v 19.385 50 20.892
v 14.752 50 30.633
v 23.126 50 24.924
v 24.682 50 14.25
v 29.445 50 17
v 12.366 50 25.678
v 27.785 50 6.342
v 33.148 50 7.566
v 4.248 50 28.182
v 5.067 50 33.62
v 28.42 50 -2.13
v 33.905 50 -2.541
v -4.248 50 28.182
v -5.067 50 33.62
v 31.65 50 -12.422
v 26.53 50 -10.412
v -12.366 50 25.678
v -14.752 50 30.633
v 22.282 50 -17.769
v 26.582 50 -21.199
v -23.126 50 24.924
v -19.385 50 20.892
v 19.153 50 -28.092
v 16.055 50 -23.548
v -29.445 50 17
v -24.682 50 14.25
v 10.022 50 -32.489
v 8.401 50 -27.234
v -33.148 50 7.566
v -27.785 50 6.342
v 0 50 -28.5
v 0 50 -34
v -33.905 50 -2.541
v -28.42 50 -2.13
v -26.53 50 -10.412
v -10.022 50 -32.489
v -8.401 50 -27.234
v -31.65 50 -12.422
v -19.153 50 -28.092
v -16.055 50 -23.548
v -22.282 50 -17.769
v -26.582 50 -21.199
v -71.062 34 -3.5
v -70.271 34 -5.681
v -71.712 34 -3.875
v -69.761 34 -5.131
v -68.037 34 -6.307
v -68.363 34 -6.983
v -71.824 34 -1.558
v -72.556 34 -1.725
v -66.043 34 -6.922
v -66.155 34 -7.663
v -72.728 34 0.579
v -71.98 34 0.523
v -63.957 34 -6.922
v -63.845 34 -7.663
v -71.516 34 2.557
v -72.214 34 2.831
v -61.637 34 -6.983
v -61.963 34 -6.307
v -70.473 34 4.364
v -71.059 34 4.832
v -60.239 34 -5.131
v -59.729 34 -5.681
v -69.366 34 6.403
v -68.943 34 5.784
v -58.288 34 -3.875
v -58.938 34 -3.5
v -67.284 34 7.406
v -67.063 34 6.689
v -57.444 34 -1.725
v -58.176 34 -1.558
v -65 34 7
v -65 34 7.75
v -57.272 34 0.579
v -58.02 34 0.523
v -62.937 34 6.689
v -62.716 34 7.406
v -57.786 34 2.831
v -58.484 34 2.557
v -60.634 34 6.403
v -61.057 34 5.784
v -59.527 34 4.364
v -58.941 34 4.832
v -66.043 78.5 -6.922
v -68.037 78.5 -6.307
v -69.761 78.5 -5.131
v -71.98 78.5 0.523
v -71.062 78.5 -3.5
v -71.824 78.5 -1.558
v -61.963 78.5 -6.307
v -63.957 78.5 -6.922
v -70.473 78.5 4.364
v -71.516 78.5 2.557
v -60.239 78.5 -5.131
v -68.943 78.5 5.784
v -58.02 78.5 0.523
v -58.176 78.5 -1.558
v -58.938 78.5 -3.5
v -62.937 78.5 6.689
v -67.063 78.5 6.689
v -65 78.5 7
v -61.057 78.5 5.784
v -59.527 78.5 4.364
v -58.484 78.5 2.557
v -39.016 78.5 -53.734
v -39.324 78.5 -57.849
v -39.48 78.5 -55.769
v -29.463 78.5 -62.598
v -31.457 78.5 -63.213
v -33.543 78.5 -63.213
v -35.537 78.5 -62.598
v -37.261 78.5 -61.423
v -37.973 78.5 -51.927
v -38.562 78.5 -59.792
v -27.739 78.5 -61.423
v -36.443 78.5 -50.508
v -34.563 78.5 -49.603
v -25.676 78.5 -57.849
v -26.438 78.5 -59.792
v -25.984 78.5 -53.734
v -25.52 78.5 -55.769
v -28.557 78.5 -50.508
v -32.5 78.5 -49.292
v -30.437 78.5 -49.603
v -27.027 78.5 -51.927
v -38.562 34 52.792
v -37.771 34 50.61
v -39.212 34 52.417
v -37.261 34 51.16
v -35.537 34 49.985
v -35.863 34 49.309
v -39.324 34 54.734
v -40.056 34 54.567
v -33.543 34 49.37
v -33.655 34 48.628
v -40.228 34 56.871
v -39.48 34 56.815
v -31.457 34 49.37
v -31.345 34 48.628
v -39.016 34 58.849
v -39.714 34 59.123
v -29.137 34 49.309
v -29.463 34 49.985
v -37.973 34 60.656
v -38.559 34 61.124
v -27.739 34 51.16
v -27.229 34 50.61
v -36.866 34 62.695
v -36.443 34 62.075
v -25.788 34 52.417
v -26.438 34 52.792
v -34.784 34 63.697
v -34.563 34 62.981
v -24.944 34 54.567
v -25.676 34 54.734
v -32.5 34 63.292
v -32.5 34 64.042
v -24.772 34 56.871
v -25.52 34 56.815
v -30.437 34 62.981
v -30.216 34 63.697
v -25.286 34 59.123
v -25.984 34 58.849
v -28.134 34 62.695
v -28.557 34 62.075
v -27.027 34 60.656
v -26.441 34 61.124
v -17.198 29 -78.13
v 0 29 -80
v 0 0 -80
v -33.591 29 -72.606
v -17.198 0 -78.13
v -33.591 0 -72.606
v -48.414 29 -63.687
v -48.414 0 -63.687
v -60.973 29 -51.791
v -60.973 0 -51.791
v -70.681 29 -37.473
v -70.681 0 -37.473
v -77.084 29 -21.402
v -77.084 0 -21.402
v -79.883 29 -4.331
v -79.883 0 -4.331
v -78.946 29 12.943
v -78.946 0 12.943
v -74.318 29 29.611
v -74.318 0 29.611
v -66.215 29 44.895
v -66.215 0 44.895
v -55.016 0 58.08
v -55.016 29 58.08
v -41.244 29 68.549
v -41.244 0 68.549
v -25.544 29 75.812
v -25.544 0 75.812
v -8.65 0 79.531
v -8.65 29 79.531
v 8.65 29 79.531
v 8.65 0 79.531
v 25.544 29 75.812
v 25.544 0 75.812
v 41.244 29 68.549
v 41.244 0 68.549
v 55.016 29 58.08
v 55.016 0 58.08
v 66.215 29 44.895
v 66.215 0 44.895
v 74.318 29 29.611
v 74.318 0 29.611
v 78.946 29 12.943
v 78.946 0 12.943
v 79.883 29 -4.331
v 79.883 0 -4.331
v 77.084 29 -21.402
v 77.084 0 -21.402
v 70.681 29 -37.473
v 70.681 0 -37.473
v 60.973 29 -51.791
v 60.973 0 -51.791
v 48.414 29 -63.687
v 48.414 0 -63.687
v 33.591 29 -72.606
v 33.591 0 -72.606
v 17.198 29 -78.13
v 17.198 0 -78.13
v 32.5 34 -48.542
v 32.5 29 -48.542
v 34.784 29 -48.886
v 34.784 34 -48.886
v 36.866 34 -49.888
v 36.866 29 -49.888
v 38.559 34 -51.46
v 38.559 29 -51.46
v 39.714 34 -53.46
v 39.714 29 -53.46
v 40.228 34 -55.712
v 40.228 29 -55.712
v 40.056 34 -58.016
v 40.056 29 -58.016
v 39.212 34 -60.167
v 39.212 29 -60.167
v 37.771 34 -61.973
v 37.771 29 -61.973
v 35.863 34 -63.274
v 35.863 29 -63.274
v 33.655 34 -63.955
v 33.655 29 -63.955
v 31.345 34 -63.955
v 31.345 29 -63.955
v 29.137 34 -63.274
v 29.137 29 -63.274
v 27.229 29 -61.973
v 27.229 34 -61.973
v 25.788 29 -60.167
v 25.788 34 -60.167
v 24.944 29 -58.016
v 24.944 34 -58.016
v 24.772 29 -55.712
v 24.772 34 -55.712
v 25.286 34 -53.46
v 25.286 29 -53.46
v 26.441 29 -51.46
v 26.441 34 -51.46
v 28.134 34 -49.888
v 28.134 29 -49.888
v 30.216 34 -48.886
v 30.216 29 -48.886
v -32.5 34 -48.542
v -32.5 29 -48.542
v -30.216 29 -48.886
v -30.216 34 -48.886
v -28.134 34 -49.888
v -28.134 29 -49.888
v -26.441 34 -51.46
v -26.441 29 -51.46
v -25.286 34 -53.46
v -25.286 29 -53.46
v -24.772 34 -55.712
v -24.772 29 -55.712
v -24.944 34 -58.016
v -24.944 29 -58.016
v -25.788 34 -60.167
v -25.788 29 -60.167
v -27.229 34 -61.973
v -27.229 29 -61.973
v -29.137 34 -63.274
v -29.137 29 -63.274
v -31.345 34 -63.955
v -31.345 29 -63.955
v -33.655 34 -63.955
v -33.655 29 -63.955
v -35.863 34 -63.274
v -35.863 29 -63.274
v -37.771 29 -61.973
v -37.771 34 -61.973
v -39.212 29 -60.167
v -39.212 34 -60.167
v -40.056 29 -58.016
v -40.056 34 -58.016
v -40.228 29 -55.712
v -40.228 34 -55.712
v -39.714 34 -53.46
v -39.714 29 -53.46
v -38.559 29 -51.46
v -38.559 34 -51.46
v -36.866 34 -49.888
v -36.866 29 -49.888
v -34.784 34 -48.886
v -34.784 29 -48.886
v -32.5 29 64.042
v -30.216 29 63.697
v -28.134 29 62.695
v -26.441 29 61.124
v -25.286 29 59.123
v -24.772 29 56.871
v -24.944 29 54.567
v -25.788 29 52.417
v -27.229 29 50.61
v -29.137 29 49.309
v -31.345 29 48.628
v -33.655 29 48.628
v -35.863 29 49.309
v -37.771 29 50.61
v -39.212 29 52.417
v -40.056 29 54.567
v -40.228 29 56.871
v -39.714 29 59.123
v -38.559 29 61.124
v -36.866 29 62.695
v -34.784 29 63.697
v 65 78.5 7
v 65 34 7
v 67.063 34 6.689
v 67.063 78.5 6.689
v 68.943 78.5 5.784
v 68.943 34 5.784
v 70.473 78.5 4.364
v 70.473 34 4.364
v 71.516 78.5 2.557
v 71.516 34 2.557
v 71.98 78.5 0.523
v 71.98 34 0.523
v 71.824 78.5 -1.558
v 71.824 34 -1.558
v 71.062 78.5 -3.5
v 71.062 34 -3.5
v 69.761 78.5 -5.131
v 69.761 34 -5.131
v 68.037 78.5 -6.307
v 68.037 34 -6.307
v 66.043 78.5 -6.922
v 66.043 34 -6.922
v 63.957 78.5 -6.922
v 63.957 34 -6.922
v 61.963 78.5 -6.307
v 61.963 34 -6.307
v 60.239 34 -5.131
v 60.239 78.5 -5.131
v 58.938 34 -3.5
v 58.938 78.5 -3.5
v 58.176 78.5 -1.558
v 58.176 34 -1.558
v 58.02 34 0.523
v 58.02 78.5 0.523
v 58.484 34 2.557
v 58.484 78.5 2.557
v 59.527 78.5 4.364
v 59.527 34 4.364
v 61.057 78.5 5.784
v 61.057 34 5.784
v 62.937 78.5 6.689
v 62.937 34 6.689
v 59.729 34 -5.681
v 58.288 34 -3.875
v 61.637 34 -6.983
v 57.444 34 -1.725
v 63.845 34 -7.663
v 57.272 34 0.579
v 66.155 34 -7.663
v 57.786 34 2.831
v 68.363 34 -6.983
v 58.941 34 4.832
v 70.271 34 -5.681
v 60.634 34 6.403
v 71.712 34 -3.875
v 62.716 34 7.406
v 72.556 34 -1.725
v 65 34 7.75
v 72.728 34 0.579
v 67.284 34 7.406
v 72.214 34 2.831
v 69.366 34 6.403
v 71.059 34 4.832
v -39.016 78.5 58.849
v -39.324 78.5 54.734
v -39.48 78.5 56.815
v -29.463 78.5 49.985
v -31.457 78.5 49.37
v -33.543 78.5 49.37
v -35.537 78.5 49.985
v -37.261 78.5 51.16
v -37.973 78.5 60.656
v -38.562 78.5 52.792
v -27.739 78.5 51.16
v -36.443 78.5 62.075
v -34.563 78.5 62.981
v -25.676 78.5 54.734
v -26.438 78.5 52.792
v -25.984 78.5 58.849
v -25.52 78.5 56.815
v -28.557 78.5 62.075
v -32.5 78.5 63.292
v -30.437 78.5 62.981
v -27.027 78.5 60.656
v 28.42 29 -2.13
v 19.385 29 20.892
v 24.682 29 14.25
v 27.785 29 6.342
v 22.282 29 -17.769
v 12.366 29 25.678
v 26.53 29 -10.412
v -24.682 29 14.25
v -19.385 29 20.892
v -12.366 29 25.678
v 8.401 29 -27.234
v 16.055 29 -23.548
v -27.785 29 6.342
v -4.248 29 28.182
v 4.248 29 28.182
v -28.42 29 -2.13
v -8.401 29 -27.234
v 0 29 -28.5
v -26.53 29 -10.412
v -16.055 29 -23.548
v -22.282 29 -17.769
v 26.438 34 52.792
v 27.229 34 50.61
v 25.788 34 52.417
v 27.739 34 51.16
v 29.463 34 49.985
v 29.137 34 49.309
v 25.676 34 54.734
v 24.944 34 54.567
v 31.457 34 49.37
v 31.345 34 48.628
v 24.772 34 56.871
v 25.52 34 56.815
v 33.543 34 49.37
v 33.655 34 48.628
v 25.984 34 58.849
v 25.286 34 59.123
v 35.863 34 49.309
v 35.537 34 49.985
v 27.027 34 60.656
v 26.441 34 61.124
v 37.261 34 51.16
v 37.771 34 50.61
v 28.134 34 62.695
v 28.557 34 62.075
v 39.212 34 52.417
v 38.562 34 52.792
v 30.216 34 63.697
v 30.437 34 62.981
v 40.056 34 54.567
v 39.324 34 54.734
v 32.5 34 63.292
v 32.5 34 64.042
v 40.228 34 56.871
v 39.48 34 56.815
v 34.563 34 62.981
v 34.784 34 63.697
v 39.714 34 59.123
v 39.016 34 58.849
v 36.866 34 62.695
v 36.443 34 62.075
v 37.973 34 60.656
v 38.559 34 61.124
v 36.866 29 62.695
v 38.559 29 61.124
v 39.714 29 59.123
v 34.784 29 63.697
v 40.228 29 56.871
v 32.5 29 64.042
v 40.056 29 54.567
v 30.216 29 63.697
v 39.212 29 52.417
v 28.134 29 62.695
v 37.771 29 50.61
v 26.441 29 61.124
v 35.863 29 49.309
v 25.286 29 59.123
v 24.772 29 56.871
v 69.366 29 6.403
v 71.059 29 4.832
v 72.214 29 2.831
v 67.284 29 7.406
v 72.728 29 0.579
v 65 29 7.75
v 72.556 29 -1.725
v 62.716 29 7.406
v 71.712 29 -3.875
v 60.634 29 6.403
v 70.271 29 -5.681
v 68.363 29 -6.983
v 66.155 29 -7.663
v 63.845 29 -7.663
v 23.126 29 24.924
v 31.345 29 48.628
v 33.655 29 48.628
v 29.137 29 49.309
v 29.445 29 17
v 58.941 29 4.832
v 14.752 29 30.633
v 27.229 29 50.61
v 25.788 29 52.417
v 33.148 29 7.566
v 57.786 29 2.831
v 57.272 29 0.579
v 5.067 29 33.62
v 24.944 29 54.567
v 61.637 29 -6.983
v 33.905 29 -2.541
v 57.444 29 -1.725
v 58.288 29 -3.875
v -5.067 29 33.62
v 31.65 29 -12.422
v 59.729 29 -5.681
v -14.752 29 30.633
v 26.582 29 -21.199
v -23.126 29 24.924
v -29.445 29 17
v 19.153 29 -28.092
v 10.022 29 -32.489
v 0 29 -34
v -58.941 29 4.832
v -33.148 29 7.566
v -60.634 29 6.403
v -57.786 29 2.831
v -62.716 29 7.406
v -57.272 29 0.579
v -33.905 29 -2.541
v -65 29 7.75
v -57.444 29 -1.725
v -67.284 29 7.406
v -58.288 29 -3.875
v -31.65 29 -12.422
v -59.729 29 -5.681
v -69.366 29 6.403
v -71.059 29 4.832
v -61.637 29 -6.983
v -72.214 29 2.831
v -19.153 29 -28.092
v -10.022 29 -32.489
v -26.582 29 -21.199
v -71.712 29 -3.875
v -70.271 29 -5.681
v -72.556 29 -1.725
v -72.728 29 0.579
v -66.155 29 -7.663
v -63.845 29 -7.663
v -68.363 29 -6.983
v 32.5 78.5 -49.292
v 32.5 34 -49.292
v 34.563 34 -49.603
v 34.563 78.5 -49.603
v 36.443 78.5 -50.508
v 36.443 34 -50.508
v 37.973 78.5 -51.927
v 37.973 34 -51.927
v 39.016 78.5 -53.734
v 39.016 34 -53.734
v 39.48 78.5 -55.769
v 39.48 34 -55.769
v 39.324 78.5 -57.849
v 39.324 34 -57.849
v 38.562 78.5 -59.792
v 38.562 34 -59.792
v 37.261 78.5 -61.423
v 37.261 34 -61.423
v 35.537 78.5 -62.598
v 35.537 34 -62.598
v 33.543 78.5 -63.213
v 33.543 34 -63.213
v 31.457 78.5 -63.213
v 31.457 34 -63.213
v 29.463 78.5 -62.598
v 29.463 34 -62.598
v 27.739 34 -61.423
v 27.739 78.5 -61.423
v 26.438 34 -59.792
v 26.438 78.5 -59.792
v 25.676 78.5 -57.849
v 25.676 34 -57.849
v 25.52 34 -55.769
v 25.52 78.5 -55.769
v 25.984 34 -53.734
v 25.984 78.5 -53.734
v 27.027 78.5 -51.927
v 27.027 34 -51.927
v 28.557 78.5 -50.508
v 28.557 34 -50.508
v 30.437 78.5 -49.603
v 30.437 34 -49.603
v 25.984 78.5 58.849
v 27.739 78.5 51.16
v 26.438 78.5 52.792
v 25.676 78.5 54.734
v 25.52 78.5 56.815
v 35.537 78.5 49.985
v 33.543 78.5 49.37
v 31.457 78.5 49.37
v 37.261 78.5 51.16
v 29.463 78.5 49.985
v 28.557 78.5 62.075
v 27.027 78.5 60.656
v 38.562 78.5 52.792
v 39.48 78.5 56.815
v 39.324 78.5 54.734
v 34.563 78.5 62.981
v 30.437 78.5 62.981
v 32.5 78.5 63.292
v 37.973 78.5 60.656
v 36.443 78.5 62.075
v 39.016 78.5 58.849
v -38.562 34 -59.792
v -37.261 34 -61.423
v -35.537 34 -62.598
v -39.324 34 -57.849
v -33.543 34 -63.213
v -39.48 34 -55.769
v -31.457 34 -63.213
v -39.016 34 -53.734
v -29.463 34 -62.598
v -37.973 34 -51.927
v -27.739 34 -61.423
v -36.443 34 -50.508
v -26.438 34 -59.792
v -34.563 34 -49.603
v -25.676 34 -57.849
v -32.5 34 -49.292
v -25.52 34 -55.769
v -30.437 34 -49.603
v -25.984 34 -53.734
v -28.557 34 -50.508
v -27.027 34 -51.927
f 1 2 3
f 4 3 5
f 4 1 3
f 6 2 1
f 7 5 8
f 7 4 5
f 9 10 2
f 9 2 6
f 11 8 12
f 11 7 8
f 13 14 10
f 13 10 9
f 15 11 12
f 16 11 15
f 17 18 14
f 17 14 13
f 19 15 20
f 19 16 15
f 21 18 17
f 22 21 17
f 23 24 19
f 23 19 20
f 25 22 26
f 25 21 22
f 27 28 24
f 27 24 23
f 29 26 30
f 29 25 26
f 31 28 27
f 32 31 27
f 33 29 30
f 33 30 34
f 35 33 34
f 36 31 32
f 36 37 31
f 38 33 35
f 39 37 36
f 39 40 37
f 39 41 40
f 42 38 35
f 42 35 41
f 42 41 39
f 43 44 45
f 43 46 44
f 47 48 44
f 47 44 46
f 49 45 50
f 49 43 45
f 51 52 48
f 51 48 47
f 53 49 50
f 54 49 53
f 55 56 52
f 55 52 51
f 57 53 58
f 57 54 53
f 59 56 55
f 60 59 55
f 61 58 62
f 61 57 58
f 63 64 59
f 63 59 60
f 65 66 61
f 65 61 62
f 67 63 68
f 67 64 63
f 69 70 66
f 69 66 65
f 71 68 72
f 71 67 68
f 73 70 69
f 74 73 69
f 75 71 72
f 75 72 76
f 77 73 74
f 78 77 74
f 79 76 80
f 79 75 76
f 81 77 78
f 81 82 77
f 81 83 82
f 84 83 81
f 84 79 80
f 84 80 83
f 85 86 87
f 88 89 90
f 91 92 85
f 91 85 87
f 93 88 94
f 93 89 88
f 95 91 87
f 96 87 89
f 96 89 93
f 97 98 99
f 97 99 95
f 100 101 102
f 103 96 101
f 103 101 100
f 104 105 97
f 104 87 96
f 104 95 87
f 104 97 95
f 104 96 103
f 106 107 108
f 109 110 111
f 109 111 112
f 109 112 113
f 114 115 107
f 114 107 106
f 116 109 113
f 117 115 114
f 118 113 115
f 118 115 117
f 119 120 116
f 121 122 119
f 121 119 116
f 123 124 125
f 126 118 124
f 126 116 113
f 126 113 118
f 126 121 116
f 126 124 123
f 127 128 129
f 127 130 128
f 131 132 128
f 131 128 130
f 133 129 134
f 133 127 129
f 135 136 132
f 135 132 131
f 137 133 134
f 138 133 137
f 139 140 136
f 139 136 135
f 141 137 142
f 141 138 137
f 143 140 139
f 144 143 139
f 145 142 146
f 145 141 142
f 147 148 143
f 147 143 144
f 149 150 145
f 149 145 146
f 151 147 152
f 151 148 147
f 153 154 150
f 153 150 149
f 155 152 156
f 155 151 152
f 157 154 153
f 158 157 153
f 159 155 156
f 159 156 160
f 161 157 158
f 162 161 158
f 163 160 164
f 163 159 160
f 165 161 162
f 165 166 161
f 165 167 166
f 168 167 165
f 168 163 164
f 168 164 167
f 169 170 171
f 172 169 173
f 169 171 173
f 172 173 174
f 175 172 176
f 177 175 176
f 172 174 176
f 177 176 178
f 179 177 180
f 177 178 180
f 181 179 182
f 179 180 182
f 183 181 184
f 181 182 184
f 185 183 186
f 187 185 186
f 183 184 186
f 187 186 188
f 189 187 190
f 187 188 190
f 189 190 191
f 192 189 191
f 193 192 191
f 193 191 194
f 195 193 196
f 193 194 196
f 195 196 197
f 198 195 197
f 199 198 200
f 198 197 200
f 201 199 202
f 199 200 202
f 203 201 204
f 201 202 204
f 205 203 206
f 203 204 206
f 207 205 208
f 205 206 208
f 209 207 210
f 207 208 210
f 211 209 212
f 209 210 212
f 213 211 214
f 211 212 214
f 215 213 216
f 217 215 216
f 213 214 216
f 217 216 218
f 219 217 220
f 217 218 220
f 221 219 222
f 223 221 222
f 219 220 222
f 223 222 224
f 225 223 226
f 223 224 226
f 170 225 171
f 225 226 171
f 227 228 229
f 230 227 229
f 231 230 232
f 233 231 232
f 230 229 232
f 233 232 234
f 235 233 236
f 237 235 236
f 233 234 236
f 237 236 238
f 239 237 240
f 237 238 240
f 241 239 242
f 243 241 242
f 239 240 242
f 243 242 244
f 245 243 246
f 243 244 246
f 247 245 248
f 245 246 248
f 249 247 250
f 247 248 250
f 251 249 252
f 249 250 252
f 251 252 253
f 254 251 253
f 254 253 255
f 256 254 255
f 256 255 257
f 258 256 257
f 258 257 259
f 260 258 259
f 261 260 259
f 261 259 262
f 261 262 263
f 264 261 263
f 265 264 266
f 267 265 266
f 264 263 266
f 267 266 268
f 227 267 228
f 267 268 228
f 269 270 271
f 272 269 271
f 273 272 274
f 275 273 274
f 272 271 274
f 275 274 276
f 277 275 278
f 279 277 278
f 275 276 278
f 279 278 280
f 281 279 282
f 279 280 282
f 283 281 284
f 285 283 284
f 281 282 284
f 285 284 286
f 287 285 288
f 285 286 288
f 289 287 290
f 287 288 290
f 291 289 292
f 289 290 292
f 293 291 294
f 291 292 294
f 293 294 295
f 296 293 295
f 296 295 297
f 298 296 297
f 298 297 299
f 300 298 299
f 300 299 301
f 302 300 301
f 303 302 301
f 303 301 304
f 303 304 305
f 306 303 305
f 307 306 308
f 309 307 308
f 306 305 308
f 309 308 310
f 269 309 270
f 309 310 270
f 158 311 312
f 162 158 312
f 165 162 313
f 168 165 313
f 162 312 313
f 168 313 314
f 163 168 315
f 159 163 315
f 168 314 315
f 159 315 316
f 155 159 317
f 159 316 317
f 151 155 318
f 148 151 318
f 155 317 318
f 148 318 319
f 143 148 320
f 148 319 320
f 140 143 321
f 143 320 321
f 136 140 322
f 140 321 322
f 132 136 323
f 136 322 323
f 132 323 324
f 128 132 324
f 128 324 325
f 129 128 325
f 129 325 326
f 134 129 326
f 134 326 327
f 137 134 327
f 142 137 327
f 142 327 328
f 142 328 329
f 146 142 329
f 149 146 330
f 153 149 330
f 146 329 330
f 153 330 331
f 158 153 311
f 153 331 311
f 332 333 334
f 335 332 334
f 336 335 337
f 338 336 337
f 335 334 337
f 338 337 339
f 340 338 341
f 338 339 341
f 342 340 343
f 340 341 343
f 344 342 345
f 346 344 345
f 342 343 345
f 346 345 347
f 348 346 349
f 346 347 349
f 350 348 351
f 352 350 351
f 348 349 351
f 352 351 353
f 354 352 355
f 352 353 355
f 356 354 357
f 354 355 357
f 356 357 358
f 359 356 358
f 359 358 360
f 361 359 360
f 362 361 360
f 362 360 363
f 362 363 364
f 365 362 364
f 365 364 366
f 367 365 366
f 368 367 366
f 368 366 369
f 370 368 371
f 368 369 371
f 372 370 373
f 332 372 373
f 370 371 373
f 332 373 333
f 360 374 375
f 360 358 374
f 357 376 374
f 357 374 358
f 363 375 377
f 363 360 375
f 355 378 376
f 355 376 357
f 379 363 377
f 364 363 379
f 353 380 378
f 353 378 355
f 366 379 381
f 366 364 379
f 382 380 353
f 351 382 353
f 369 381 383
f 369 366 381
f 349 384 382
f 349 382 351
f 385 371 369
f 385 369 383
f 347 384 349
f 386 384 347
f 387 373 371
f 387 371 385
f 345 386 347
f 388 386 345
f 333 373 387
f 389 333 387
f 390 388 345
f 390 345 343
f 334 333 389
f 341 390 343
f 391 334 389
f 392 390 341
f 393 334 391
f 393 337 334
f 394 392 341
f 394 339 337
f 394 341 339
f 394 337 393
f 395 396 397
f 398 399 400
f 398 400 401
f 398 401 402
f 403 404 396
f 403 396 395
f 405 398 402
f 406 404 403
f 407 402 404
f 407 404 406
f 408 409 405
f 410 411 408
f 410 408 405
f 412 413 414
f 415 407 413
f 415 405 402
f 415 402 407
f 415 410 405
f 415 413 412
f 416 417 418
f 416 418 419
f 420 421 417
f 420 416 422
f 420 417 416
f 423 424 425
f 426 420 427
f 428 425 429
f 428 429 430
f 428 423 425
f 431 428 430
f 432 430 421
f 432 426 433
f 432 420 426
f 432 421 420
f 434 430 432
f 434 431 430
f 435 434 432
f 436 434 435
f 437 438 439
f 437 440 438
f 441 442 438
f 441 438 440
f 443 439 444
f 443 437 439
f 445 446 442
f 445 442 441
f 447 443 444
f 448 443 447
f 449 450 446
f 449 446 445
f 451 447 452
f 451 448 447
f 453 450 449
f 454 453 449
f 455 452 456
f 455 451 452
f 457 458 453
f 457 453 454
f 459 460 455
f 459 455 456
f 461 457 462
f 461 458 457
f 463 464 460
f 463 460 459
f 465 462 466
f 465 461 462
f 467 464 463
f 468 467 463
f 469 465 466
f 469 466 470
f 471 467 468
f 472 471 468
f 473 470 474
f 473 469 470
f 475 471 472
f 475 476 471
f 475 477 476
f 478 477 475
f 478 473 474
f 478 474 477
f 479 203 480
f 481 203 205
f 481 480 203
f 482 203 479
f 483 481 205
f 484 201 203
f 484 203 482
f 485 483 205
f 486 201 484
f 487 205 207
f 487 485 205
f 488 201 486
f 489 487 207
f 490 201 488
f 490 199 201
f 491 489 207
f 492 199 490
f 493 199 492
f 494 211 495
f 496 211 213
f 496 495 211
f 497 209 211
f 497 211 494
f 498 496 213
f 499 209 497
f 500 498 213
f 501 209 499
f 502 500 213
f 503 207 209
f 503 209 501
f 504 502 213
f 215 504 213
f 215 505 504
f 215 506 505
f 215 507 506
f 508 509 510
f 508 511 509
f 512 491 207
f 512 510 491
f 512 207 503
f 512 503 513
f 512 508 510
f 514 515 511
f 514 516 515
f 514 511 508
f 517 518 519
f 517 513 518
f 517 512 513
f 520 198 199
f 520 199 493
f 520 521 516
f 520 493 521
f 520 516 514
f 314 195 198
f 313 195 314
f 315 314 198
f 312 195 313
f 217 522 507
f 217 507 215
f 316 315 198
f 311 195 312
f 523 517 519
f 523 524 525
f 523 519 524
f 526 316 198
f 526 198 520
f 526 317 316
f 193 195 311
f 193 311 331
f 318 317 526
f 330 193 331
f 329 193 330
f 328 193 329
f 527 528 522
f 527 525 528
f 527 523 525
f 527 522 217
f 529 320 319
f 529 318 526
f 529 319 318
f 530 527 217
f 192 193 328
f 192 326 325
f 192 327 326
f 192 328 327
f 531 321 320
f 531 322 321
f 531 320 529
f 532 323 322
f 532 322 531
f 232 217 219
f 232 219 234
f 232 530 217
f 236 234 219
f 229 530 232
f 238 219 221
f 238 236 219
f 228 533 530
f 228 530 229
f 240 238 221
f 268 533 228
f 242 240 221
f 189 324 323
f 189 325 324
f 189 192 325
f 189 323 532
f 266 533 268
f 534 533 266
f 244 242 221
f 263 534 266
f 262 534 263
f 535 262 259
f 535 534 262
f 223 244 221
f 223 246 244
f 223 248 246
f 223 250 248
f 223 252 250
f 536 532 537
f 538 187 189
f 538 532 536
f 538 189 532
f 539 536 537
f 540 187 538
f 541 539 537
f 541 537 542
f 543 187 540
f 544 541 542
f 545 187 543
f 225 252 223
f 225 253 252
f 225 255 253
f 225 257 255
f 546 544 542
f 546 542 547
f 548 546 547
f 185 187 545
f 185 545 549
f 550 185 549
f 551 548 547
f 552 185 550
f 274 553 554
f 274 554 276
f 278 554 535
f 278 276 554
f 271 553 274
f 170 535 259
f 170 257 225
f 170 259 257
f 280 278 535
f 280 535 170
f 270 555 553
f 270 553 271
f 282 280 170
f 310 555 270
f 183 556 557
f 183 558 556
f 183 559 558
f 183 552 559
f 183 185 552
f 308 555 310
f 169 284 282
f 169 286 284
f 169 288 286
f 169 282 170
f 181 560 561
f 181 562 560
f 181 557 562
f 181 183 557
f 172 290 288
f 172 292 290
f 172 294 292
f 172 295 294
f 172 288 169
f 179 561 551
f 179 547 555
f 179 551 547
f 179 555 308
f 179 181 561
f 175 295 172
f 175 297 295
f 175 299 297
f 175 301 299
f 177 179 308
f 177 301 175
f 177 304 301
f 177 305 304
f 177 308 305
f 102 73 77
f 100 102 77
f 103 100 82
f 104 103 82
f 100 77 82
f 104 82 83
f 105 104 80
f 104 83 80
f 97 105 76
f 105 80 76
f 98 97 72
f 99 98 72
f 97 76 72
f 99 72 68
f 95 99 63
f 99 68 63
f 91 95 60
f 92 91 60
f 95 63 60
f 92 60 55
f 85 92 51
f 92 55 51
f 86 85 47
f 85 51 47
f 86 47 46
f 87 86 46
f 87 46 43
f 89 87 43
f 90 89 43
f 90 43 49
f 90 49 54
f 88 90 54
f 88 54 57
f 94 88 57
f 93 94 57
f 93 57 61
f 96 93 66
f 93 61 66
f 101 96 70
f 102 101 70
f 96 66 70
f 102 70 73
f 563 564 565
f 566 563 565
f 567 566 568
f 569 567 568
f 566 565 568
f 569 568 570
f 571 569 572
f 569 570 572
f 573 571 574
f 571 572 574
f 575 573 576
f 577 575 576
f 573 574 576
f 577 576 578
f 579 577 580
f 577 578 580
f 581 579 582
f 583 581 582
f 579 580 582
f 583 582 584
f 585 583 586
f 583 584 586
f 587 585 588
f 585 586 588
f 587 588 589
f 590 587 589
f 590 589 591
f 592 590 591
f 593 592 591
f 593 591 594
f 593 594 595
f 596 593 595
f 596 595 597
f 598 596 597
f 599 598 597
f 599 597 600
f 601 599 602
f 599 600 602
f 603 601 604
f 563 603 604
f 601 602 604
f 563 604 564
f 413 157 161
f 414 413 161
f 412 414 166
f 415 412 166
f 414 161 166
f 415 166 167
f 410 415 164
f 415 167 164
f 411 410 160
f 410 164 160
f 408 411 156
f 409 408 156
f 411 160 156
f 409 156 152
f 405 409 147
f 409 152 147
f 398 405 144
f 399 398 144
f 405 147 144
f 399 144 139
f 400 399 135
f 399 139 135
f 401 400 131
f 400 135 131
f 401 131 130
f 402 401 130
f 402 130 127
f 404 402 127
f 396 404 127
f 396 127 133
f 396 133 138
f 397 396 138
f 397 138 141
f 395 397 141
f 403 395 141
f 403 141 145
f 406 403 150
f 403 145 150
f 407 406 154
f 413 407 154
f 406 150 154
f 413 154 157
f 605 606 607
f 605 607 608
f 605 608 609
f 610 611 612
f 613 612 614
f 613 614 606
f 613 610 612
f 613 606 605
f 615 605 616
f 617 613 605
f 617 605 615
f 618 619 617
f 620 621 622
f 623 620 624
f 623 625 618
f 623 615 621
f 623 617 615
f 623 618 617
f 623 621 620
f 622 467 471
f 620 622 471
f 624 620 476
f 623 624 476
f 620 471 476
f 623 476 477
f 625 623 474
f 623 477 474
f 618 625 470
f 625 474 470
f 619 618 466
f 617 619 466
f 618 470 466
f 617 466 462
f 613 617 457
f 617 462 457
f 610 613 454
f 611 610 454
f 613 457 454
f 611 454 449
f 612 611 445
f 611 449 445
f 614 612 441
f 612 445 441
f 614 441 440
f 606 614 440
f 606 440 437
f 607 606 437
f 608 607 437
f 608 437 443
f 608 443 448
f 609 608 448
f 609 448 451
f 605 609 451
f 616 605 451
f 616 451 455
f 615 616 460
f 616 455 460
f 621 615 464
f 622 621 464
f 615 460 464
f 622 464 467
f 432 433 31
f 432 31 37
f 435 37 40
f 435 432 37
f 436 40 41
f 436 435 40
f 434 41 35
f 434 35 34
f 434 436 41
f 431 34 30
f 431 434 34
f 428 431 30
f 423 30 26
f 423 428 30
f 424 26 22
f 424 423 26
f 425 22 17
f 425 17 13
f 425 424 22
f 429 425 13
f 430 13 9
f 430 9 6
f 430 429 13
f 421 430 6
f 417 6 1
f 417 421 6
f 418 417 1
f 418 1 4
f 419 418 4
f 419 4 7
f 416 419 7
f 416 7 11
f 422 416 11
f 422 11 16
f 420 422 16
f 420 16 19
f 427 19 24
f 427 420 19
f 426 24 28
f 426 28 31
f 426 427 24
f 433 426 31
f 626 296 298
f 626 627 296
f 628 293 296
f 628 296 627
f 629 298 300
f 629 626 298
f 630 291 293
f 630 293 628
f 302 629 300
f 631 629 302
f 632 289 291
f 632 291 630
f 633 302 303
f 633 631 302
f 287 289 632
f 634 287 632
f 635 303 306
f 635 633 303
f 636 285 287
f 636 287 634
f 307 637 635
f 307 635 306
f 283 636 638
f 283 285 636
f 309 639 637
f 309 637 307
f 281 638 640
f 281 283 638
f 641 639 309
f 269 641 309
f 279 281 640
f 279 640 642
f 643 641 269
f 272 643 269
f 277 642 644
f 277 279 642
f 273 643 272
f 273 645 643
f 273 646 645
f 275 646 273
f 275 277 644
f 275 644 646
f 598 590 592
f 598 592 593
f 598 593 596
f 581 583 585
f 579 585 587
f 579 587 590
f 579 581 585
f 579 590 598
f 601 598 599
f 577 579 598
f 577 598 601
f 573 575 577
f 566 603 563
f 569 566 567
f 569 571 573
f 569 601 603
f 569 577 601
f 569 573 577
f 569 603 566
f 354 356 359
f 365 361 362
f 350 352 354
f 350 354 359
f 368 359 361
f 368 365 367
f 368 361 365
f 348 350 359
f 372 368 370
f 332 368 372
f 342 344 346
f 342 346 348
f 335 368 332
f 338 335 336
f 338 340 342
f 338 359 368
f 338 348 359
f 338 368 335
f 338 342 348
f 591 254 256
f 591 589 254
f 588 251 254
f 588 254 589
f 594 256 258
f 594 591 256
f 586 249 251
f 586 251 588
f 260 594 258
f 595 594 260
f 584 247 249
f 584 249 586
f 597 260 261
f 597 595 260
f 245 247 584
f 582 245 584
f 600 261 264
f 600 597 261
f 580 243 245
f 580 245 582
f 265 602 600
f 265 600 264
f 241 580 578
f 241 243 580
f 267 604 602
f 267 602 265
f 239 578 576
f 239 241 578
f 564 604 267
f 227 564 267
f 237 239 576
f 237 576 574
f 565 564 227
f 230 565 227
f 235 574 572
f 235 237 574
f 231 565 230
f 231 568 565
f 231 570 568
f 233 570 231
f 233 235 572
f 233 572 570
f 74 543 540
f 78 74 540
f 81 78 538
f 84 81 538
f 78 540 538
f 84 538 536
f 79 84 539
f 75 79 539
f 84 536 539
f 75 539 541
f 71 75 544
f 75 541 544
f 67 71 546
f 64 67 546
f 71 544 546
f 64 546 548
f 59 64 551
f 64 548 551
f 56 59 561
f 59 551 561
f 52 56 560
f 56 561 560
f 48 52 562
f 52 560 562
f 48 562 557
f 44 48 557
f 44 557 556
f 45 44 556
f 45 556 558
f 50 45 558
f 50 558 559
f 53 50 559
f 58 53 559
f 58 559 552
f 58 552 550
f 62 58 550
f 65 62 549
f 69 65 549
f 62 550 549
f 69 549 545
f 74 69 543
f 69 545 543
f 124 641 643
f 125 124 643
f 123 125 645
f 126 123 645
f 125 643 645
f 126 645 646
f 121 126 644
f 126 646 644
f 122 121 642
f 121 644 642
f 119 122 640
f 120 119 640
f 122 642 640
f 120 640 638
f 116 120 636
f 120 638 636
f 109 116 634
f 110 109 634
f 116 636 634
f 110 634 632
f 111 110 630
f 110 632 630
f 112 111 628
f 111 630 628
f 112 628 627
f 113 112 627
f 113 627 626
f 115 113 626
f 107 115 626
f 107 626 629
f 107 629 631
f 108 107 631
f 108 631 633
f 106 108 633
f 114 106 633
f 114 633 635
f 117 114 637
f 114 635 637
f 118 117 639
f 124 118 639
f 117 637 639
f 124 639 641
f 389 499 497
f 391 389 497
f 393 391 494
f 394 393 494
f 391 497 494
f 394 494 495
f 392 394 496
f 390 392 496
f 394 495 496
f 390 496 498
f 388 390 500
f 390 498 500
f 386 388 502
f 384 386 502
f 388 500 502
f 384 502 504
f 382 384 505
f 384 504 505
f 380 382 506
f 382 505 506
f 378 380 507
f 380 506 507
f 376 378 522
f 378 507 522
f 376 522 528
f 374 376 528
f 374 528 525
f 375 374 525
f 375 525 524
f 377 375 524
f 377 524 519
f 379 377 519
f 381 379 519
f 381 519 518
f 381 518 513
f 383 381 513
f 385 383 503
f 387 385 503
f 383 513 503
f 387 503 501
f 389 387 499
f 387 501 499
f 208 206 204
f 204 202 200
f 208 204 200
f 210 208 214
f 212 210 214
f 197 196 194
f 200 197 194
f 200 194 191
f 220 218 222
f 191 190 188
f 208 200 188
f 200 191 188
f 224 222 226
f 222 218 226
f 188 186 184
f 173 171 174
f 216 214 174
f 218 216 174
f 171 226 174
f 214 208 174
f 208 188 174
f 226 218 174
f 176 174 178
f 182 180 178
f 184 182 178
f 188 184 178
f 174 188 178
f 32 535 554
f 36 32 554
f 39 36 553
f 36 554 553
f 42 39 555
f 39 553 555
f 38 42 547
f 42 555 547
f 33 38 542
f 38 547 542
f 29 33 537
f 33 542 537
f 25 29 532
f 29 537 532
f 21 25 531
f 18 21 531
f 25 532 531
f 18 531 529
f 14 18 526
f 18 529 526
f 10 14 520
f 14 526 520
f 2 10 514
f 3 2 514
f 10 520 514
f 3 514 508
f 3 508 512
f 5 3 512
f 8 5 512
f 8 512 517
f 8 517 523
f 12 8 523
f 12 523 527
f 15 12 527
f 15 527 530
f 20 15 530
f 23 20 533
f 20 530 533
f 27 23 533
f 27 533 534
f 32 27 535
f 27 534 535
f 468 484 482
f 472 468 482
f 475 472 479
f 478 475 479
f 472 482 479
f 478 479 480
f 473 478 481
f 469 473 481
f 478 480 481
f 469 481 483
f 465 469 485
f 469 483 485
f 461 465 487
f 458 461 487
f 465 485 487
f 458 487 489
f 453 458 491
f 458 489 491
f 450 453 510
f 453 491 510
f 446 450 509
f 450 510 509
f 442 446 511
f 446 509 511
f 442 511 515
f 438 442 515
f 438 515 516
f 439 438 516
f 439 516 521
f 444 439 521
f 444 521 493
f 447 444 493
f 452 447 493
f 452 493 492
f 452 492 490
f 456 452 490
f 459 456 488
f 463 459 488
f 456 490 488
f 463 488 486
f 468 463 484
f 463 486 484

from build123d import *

# Parameters (mm, degrees)
SKETCH1_R           = 80
BOSS_EXTRUDE1_DEPTH = 29
SKETCH2_R           = 34
SKETCH2_R_2         = 28.5
BOSS_EXTRUDE2_DEPTH = 21
SKETCH3_R           = 7.75
BOSS_EXTRUDE3_DEPTH = 5
SKETCH4_R           = 7
BOSS_EXTRUDE4_DEPTH = 44.5


with BuildPart() as part:
    # Sketch1 → Boss-Extrude1 (new body)
    with BuildSketch(Plane(origin=(0, 0, 0), x_dir=(1, 0, 0), z_dir=(0, 1, 0))):
        with Locations(Location((0, 0, 0), (0, 0, 90))):
            Circle(SKETCH1_R)
    extrude(amount=BOSS_EXTRUDE1_DEPTH)

    # Sketch2 → Boss-Extrude2 (add)
    with BuildSketch(Plane(origin=(0, 29, 0), x_dir=(1, 0, 0), z_dir=(0, 1, 0))):
        with Locations(Location((0, 0, 0), (0, 0, 90))):
            Circle(SKETCH2_R)
        with Locations(Location((0, 0, 0), (0, 0, 90))):
            Circle(SKETCH2_R_2, mode=Mode.SUBTRACT)
    extrude(amount=BOSS_EXTRUDE2_DEPTH)

    # Sketch3 → Boss-Extrude3 (add)
    with BuildSketch(Plane(origin=(0, 29, 0), x_dir=(1, 0, 0), z_dir=(0, 1, 0))):
        with Locations(Location((65, 0, 0), (0, 0, 270))):
            Circle(SKETCH3_R)
        with Locations(Location((32.5, -56.291651246, 0), (0, 0, 270))):
            Circle(SKETCH3_R)
        with Locations(Location((-32.5, -56.291651246, 0), (0, 0, 270))):
            Circle(SKETCH3_R)
        with Locations(Location((-65, 0, 0), (0, 0, 270))):
            Circle(SKETCH3_R)
        with Locations(Location((-32.5, 56.291651246, 0), (0, 0, 270))):
            Circle(SKETCH3_R)
        with Locations(Location((32.5, 56.291651246, 0), (0, 0, 270))):
            Circle(SKETCH3_R)
    extrude(amount=BOSS_EXTRUDE3_DEPTH)

    # Sketch4 → Boss-Extrude4 (add)
    with BuildSketch(Plane(origin=(0, 34, 0), x_dir=(1, 0, 0), z_dir=(0, 1, 0))):
        with Locations(Location((65, 0, 0), (0, 0, 270))):
            Circle(SKETCH4_R)
        with Locations(Location((32.5, -56.291651246, 0), (0, 0, 270))):
            Circle(SKETCH4_R)
        with Locations(Location((-32.5, -56.291651246, 0), (0, 0, 270))):
            Circle(SKETCH4_R)
        with Locations(Location((-65, 0, 0), (0, 0, 270))):
            Circle(SKETCH4_R)
        with Locations(Location((-32.5, 56.291651246, 0), (0, 0, 270))):
            Circle(SKETCH4_R)
        with Locations(Location((32.5, 56.291651246, 0), (0, 0, 270))):
            Circle(SKETCH4_R)
    extrude(amount=BOSS_EXTRUDE4_DEPTH)


solid = part.part
